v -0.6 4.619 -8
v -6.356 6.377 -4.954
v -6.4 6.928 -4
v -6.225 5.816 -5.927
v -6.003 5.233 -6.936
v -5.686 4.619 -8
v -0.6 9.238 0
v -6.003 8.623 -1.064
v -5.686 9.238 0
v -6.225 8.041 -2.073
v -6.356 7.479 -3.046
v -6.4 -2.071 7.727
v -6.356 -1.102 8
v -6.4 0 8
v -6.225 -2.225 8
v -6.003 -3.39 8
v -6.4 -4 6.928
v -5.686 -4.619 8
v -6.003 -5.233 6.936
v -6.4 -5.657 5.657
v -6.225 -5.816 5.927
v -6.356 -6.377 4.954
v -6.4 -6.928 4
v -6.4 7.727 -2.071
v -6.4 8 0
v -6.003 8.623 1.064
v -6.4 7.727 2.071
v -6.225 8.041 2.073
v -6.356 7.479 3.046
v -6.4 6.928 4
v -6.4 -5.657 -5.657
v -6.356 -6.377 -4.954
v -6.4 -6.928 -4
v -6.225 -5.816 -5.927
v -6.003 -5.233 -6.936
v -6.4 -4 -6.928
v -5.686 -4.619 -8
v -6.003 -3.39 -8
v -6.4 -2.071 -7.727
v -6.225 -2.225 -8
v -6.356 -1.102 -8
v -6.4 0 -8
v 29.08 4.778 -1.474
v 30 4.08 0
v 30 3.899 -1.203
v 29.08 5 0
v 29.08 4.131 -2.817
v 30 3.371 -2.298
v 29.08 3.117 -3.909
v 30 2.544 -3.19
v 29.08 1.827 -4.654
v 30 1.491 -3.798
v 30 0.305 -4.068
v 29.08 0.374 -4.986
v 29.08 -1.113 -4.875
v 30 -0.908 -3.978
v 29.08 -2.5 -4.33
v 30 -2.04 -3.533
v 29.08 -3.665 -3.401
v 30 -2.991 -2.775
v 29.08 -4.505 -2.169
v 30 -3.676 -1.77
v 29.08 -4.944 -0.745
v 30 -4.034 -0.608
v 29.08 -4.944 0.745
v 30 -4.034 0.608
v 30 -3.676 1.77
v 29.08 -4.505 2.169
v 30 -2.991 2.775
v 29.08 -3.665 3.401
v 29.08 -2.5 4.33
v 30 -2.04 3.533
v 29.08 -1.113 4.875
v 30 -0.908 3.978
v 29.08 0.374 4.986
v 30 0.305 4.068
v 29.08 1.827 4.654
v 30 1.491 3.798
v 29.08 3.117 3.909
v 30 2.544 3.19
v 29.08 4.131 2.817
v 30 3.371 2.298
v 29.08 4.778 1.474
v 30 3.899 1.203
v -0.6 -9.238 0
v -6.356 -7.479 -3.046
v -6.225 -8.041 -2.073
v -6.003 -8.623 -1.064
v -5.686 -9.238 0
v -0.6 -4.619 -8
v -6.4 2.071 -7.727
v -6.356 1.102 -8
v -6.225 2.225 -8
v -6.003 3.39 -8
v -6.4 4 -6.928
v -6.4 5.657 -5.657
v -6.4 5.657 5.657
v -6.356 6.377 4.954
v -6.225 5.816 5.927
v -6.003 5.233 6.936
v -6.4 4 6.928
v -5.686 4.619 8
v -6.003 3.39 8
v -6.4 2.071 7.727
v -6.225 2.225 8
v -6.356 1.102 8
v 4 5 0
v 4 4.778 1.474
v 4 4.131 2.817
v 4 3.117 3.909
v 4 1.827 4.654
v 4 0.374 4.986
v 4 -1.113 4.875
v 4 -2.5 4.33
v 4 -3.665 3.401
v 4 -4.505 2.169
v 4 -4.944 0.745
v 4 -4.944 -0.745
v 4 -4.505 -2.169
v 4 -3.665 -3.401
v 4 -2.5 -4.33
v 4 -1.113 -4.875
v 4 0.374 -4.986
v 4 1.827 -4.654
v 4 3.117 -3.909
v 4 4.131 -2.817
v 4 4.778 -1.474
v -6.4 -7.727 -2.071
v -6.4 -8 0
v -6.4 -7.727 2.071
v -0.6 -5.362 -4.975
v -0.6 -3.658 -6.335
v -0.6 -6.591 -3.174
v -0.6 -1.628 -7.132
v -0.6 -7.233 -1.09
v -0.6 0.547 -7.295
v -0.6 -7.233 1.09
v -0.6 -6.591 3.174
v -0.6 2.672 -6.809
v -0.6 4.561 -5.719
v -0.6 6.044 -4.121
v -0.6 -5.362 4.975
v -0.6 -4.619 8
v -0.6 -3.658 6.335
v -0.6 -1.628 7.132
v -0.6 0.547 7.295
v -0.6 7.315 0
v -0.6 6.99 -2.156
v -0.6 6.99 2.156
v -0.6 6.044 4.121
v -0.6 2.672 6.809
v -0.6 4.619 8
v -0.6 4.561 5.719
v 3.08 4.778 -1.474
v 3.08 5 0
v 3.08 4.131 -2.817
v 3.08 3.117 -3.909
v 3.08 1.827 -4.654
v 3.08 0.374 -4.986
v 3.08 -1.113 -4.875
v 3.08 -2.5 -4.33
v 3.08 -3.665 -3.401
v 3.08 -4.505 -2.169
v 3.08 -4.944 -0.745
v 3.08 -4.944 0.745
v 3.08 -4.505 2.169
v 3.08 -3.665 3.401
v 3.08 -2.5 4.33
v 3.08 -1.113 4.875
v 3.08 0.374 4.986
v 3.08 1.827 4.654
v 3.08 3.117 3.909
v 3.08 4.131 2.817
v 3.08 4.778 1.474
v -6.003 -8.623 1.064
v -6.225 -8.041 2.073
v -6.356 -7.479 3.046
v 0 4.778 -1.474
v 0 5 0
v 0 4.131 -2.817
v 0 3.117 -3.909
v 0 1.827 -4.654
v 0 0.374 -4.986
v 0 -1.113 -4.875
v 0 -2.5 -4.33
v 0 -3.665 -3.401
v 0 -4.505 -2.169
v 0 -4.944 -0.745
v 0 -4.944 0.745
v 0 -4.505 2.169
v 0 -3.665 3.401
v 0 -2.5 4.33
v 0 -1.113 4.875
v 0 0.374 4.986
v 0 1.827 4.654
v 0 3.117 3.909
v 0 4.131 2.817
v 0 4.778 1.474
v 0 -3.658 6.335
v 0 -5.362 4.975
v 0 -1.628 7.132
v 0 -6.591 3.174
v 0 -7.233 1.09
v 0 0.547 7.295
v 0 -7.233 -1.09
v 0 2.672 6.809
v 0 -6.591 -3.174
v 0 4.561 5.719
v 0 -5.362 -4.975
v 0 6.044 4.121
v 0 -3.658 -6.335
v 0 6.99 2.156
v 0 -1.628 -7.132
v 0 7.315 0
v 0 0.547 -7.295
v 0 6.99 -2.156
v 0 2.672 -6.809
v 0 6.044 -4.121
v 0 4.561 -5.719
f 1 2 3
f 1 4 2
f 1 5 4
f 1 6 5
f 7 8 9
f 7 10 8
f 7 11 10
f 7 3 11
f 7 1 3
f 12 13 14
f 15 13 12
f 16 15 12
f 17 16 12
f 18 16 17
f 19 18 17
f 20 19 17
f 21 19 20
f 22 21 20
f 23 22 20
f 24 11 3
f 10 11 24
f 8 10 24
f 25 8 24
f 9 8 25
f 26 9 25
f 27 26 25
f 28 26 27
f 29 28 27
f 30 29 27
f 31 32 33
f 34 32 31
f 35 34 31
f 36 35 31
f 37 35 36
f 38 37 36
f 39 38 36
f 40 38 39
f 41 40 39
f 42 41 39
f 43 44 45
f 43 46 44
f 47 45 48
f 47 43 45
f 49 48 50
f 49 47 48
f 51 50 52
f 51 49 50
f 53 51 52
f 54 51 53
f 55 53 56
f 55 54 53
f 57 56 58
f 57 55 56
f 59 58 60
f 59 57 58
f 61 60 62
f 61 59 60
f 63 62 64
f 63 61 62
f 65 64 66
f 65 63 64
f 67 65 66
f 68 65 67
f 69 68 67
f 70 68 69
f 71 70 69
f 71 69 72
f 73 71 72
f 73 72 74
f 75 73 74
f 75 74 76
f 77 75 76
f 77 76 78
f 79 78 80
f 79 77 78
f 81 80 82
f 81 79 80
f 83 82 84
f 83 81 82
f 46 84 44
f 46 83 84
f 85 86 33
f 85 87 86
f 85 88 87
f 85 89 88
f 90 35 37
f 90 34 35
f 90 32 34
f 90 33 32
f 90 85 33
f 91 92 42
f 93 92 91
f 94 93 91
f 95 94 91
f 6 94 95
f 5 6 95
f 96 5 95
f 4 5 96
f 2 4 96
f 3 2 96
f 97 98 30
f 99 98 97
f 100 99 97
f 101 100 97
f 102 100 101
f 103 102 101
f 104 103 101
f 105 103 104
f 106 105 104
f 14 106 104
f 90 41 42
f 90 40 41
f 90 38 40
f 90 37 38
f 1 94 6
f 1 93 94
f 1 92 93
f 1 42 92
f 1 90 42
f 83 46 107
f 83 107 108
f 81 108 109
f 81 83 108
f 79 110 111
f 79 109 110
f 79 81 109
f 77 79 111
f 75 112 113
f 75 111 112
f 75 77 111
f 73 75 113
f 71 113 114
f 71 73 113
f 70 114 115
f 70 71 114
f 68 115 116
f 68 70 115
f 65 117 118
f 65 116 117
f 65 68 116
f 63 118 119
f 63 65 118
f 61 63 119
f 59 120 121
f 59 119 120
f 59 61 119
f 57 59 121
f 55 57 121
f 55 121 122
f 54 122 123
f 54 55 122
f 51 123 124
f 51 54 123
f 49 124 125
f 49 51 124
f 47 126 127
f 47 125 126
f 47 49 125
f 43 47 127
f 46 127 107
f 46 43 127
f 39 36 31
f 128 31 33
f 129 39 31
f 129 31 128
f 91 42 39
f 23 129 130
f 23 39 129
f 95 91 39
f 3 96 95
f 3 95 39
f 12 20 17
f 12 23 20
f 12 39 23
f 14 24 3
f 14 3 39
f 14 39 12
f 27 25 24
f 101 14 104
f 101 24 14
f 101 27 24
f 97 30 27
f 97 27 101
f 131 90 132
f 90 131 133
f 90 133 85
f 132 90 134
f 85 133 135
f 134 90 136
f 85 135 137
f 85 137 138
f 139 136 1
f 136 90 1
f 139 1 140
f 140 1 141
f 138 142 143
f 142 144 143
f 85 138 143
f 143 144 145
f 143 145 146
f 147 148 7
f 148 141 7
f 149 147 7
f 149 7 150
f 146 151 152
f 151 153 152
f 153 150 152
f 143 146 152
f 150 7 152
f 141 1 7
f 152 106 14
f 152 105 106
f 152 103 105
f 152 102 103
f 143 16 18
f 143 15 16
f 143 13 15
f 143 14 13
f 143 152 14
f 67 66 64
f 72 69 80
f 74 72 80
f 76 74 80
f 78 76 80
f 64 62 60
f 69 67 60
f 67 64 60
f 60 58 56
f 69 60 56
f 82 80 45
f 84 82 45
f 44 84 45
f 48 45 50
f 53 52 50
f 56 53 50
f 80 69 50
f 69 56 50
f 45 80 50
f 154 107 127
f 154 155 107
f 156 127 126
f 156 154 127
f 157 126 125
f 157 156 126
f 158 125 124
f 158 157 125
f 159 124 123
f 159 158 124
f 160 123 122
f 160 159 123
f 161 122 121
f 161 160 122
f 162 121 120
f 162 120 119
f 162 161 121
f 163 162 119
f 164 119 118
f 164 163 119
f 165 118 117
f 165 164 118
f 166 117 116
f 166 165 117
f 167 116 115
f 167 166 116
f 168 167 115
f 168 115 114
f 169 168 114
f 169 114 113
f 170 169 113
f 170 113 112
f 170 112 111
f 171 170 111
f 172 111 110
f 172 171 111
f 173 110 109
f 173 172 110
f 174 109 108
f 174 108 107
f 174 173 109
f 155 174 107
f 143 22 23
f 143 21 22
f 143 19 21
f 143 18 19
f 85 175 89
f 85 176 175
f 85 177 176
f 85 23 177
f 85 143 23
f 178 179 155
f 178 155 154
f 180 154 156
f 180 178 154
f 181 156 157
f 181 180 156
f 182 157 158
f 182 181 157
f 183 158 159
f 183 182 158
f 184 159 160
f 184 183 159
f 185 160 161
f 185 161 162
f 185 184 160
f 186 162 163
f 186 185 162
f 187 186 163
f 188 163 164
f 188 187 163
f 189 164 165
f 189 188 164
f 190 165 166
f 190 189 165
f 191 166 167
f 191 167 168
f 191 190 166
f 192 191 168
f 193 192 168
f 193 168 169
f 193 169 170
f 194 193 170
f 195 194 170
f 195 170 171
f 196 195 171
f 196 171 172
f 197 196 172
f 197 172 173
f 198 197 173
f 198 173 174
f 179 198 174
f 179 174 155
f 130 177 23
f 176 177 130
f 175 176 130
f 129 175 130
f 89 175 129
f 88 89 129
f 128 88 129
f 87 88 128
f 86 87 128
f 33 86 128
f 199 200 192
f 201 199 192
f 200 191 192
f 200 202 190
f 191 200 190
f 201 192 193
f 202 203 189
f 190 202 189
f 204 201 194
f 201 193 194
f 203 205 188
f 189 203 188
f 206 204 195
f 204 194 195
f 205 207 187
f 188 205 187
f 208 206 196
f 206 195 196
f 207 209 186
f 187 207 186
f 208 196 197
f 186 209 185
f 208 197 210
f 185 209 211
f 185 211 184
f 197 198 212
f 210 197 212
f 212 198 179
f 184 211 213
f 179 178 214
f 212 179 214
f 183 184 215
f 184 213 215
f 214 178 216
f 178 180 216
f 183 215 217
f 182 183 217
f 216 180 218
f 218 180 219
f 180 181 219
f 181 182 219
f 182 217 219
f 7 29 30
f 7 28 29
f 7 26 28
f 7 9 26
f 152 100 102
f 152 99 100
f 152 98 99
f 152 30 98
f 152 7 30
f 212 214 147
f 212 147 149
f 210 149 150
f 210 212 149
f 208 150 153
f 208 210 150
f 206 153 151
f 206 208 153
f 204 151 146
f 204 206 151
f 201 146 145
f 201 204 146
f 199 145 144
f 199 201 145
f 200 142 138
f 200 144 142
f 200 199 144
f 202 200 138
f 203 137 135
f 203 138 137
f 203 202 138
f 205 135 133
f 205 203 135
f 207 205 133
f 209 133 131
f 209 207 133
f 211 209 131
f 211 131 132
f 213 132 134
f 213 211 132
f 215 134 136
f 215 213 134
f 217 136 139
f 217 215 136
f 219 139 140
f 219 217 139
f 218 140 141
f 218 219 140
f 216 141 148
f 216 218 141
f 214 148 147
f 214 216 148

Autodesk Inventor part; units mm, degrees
ref_plane "YZ Plane" through (0, 0, 0) normal (1, 0, 0) x (0, 1, 0)
ref_plane "XZ Plane" through (0, 0, 0) normal (0, 1, 0) x (-1, 0, 0)
sketch "Sketch1" plane through (0, 0, 0) normal (0, 0, 1) x (1, 0, 0)
  line L0 (0, 7.315) -> (0, 5)
  line L1 (4, 5) -> (30, 5)
  line L2 (30, 5) -> (30, 0)
  line L3 (30, 0) -> (-0.6001, 0)
  line L4 (-6.7201, 0) -> (36.12, 0) projected
  line L5 (-0.6001, 0) -> (-0.6001, 7.315)
  line L6 (-0.6001, 7.315) -> (0, 7.315)
  line L7 (4, 5) -> (3.0797, 5)
  line L8 (3.0797, 5) -> (0, 5)
  line L9 (0, -1.463) -> (0, 8.778) projected
  dimension "d0" = 30
  dimension "d1" = 26
  dimension "d2" = 10
  dimension "d9" = 0.6001
  dimension "d10" = 14.63
  dimension "d13" = 0.9203
  dimension "d14" = 10
revolve "Body" add sketch "Sketch1" angle 360 about axis through (30, 0, 0) along (-1, 0, 0)
sketch "Sketch2" plane through (-0.6001, 0, 0) normal (-1, 0, 0) x (0, 0, 1)
  line L0 (0, 9.2376) -> (8, 4.6188)
  line L1 (8, 4.6188) -> (8, -4.6188)
  line L2 (8, -4.6188) -> (0, -9.2376)
  line L3 (0, -9.2376) -> (-8, -4.6188)
  line L4 (-8, -4.6188) -> (-8, 4.6188)
  line L5 (-8, 4.6188) -> (0, 9.2376)
  point P0 (0, 0)
  point P1 (0, 0)
  dimension "d11" = 16
extrude "Head" add sketch "Sketch2" along normal blind 5.8
sketch "Sketch4" plane through (0, 0, 0) normal (0, 0, 1) x (1, 0, 0)
  line L0 (-6.4001, 8) -> (-6.4001, 9.2376)
  line L1 (-6.4001, 9.2376) -> (-5.6856, 9.2376)
  line L2 (-5.6856, 9.2376) -> (-6.4001, 8)
  line L3 (-7.5601, 0) -> (0.5599, 0) projected
  line L4 (-0.6001, 9.2376) -> (-6.4001, 9.2376) projected
  line L5 (-6.4001, 4.6188) -> (-6.4001, 9.2376) projected
  dimension "d5" = 30
  dimension "d19" = 16
revolve "Chamfer1" cut sketch "Sketch4" angle 360 about axis through (-10, 0, 0) along (1, 0, 0)
thread "Thread" size "M10x1.5" class "6g" standard "ISO Metric profile" length 10
chamfer "Chamfer2" distance 0.9202 distance2 0.9203 1 edges at (30, -5, 0) measured on face at (30, -0.2009, 0.1054)
ref_plane "Work Plane1" through (1.525, 0, 0) normal (0, 0, 1) x (1, 0, 0)
equation "\"d11\" = SW"
equation "\"d3\" = KOH - SD"
equation "\"d15\" = GD"
equation "\"d6\" = -0.5 * SPD + 0.5 * GD"
equation "\"d1\" = GEL"
equation "\"d2\" = GD"
equation "\"d10\" = SD2"
equation "\"d14\" = BDM"
equation "\"d5\" = ANG1"
equation "\"d19\" = SW0"
equation "\"NLG\" = 45"
equation "\"GD\" = NND"
equation "\"BDM\" = NND"
equation "\"KOH\" = 6.4"
equation "\"GEL\" = 26"
equation "\"SW\" = 16"
equation "\"SW0\" = SW"
equation "\"SPD\" = NND - 1.2269 * PTC"
equation "\"SD2\" = 14.63"
equation "\"SD\" = 0.6"
equation "\"ANG1\" = 30deg"
equation "\"GAL\" = 0.61345 * PTC"
equation "\"GUL\" = 0.61345 * PTC"
equation "\"RR\" = 0.4"
equation "\"GD1\" = THREADDIA - 1.2269 * PTC"
equation "\"SDH\" = SD2"
equation "\"TOA\" = 30deg"
equation "\"PTC\" = 1.5"
equation "\"E0\" = 1.155 * SW"
equation "\"NND\" = 10"
equation "\"THREADDIA\" = 10"
properties part number "ISO 4014 - M10 x 45" material "Stainless Steel, 440C"
